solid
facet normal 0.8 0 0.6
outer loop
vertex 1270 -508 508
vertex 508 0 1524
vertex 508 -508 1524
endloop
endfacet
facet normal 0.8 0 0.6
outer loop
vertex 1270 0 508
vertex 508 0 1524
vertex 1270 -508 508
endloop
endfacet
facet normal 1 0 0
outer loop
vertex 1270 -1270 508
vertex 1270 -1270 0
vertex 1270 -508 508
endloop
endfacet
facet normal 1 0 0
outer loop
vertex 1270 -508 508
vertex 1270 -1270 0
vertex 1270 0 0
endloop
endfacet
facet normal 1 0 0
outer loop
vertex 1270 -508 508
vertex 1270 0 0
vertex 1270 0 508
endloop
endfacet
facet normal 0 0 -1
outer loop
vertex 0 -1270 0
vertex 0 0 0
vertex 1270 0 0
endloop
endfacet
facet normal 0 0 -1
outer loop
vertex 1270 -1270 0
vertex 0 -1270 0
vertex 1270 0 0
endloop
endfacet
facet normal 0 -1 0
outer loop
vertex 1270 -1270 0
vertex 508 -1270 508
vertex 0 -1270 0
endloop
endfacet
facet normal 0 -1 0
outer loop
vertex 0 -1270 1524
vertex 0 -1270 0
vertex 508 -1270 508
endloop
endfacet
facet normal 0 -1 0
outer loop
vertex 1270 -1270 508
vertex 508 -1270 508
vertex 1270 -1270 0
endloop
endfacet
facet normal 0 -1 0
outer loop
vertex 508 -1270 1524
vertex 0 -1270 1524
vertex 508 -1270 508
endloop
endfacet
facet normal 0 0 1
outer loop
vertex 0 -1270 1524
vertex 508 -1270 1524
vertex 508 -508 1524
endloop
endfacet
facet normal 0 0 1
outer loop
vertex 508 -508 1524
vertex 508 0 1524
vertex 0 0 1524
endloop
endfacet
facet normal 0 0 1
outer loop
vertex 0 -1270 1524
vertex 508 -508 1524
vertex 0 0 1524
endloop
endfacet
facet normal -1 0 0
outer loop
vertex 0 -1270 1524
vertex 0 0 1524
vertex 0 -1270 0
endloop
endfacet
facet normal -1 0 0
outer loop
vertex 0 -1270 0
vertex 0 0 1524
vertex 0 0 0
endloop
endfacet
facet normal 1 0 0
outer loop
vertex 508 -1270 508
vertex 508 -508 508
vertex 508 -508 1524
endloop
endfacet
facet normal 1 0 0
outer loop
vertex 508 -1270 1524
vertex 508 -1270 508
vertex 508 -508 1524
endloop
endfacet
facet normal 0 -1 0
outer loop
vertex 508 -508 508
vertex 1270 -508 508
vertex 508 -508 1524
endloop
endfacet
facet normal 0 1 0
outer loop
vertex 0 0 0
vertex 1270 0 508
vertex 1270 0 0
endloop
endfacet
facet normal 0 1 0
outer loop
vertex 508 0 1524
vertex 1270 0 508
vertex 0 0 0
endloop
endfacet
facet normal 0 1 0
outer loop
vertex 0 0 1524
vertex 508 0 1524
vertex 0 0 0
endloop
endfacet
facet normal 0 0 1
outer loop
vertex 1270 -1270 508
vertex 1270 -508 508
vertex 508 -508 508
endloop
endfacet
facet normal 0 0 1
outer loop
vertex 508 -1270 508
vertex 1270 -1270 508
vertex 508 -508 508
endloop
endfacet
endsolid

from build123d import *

# Parameters (mm, degrees)
F1_DEPTH = 1270
F3_DEPTH = 508


with BuildPart() as f1:
    # F0 (on Front) → F1 (new body)
    with BuildSketch(Plane.XZ):
        Polygon((0, 1524), (0, 0), (1270, 0), (1270, 508), (508, 508), (508, 1524), align=None)
    extrude(amount=F1_DEPTH)

    # F2 (on face) → F3 (join)
    with BuildSketch(Plane(origin=(0, 0, 0), x_dir=(-1, 0, 0), z_dir=(0, 1, 0))):
        Polygon((-508, 508), (-508, 1524), (-1270, 508), align=None)
    extrude(amount=-F3_DEPTH)


solid = f1.part
